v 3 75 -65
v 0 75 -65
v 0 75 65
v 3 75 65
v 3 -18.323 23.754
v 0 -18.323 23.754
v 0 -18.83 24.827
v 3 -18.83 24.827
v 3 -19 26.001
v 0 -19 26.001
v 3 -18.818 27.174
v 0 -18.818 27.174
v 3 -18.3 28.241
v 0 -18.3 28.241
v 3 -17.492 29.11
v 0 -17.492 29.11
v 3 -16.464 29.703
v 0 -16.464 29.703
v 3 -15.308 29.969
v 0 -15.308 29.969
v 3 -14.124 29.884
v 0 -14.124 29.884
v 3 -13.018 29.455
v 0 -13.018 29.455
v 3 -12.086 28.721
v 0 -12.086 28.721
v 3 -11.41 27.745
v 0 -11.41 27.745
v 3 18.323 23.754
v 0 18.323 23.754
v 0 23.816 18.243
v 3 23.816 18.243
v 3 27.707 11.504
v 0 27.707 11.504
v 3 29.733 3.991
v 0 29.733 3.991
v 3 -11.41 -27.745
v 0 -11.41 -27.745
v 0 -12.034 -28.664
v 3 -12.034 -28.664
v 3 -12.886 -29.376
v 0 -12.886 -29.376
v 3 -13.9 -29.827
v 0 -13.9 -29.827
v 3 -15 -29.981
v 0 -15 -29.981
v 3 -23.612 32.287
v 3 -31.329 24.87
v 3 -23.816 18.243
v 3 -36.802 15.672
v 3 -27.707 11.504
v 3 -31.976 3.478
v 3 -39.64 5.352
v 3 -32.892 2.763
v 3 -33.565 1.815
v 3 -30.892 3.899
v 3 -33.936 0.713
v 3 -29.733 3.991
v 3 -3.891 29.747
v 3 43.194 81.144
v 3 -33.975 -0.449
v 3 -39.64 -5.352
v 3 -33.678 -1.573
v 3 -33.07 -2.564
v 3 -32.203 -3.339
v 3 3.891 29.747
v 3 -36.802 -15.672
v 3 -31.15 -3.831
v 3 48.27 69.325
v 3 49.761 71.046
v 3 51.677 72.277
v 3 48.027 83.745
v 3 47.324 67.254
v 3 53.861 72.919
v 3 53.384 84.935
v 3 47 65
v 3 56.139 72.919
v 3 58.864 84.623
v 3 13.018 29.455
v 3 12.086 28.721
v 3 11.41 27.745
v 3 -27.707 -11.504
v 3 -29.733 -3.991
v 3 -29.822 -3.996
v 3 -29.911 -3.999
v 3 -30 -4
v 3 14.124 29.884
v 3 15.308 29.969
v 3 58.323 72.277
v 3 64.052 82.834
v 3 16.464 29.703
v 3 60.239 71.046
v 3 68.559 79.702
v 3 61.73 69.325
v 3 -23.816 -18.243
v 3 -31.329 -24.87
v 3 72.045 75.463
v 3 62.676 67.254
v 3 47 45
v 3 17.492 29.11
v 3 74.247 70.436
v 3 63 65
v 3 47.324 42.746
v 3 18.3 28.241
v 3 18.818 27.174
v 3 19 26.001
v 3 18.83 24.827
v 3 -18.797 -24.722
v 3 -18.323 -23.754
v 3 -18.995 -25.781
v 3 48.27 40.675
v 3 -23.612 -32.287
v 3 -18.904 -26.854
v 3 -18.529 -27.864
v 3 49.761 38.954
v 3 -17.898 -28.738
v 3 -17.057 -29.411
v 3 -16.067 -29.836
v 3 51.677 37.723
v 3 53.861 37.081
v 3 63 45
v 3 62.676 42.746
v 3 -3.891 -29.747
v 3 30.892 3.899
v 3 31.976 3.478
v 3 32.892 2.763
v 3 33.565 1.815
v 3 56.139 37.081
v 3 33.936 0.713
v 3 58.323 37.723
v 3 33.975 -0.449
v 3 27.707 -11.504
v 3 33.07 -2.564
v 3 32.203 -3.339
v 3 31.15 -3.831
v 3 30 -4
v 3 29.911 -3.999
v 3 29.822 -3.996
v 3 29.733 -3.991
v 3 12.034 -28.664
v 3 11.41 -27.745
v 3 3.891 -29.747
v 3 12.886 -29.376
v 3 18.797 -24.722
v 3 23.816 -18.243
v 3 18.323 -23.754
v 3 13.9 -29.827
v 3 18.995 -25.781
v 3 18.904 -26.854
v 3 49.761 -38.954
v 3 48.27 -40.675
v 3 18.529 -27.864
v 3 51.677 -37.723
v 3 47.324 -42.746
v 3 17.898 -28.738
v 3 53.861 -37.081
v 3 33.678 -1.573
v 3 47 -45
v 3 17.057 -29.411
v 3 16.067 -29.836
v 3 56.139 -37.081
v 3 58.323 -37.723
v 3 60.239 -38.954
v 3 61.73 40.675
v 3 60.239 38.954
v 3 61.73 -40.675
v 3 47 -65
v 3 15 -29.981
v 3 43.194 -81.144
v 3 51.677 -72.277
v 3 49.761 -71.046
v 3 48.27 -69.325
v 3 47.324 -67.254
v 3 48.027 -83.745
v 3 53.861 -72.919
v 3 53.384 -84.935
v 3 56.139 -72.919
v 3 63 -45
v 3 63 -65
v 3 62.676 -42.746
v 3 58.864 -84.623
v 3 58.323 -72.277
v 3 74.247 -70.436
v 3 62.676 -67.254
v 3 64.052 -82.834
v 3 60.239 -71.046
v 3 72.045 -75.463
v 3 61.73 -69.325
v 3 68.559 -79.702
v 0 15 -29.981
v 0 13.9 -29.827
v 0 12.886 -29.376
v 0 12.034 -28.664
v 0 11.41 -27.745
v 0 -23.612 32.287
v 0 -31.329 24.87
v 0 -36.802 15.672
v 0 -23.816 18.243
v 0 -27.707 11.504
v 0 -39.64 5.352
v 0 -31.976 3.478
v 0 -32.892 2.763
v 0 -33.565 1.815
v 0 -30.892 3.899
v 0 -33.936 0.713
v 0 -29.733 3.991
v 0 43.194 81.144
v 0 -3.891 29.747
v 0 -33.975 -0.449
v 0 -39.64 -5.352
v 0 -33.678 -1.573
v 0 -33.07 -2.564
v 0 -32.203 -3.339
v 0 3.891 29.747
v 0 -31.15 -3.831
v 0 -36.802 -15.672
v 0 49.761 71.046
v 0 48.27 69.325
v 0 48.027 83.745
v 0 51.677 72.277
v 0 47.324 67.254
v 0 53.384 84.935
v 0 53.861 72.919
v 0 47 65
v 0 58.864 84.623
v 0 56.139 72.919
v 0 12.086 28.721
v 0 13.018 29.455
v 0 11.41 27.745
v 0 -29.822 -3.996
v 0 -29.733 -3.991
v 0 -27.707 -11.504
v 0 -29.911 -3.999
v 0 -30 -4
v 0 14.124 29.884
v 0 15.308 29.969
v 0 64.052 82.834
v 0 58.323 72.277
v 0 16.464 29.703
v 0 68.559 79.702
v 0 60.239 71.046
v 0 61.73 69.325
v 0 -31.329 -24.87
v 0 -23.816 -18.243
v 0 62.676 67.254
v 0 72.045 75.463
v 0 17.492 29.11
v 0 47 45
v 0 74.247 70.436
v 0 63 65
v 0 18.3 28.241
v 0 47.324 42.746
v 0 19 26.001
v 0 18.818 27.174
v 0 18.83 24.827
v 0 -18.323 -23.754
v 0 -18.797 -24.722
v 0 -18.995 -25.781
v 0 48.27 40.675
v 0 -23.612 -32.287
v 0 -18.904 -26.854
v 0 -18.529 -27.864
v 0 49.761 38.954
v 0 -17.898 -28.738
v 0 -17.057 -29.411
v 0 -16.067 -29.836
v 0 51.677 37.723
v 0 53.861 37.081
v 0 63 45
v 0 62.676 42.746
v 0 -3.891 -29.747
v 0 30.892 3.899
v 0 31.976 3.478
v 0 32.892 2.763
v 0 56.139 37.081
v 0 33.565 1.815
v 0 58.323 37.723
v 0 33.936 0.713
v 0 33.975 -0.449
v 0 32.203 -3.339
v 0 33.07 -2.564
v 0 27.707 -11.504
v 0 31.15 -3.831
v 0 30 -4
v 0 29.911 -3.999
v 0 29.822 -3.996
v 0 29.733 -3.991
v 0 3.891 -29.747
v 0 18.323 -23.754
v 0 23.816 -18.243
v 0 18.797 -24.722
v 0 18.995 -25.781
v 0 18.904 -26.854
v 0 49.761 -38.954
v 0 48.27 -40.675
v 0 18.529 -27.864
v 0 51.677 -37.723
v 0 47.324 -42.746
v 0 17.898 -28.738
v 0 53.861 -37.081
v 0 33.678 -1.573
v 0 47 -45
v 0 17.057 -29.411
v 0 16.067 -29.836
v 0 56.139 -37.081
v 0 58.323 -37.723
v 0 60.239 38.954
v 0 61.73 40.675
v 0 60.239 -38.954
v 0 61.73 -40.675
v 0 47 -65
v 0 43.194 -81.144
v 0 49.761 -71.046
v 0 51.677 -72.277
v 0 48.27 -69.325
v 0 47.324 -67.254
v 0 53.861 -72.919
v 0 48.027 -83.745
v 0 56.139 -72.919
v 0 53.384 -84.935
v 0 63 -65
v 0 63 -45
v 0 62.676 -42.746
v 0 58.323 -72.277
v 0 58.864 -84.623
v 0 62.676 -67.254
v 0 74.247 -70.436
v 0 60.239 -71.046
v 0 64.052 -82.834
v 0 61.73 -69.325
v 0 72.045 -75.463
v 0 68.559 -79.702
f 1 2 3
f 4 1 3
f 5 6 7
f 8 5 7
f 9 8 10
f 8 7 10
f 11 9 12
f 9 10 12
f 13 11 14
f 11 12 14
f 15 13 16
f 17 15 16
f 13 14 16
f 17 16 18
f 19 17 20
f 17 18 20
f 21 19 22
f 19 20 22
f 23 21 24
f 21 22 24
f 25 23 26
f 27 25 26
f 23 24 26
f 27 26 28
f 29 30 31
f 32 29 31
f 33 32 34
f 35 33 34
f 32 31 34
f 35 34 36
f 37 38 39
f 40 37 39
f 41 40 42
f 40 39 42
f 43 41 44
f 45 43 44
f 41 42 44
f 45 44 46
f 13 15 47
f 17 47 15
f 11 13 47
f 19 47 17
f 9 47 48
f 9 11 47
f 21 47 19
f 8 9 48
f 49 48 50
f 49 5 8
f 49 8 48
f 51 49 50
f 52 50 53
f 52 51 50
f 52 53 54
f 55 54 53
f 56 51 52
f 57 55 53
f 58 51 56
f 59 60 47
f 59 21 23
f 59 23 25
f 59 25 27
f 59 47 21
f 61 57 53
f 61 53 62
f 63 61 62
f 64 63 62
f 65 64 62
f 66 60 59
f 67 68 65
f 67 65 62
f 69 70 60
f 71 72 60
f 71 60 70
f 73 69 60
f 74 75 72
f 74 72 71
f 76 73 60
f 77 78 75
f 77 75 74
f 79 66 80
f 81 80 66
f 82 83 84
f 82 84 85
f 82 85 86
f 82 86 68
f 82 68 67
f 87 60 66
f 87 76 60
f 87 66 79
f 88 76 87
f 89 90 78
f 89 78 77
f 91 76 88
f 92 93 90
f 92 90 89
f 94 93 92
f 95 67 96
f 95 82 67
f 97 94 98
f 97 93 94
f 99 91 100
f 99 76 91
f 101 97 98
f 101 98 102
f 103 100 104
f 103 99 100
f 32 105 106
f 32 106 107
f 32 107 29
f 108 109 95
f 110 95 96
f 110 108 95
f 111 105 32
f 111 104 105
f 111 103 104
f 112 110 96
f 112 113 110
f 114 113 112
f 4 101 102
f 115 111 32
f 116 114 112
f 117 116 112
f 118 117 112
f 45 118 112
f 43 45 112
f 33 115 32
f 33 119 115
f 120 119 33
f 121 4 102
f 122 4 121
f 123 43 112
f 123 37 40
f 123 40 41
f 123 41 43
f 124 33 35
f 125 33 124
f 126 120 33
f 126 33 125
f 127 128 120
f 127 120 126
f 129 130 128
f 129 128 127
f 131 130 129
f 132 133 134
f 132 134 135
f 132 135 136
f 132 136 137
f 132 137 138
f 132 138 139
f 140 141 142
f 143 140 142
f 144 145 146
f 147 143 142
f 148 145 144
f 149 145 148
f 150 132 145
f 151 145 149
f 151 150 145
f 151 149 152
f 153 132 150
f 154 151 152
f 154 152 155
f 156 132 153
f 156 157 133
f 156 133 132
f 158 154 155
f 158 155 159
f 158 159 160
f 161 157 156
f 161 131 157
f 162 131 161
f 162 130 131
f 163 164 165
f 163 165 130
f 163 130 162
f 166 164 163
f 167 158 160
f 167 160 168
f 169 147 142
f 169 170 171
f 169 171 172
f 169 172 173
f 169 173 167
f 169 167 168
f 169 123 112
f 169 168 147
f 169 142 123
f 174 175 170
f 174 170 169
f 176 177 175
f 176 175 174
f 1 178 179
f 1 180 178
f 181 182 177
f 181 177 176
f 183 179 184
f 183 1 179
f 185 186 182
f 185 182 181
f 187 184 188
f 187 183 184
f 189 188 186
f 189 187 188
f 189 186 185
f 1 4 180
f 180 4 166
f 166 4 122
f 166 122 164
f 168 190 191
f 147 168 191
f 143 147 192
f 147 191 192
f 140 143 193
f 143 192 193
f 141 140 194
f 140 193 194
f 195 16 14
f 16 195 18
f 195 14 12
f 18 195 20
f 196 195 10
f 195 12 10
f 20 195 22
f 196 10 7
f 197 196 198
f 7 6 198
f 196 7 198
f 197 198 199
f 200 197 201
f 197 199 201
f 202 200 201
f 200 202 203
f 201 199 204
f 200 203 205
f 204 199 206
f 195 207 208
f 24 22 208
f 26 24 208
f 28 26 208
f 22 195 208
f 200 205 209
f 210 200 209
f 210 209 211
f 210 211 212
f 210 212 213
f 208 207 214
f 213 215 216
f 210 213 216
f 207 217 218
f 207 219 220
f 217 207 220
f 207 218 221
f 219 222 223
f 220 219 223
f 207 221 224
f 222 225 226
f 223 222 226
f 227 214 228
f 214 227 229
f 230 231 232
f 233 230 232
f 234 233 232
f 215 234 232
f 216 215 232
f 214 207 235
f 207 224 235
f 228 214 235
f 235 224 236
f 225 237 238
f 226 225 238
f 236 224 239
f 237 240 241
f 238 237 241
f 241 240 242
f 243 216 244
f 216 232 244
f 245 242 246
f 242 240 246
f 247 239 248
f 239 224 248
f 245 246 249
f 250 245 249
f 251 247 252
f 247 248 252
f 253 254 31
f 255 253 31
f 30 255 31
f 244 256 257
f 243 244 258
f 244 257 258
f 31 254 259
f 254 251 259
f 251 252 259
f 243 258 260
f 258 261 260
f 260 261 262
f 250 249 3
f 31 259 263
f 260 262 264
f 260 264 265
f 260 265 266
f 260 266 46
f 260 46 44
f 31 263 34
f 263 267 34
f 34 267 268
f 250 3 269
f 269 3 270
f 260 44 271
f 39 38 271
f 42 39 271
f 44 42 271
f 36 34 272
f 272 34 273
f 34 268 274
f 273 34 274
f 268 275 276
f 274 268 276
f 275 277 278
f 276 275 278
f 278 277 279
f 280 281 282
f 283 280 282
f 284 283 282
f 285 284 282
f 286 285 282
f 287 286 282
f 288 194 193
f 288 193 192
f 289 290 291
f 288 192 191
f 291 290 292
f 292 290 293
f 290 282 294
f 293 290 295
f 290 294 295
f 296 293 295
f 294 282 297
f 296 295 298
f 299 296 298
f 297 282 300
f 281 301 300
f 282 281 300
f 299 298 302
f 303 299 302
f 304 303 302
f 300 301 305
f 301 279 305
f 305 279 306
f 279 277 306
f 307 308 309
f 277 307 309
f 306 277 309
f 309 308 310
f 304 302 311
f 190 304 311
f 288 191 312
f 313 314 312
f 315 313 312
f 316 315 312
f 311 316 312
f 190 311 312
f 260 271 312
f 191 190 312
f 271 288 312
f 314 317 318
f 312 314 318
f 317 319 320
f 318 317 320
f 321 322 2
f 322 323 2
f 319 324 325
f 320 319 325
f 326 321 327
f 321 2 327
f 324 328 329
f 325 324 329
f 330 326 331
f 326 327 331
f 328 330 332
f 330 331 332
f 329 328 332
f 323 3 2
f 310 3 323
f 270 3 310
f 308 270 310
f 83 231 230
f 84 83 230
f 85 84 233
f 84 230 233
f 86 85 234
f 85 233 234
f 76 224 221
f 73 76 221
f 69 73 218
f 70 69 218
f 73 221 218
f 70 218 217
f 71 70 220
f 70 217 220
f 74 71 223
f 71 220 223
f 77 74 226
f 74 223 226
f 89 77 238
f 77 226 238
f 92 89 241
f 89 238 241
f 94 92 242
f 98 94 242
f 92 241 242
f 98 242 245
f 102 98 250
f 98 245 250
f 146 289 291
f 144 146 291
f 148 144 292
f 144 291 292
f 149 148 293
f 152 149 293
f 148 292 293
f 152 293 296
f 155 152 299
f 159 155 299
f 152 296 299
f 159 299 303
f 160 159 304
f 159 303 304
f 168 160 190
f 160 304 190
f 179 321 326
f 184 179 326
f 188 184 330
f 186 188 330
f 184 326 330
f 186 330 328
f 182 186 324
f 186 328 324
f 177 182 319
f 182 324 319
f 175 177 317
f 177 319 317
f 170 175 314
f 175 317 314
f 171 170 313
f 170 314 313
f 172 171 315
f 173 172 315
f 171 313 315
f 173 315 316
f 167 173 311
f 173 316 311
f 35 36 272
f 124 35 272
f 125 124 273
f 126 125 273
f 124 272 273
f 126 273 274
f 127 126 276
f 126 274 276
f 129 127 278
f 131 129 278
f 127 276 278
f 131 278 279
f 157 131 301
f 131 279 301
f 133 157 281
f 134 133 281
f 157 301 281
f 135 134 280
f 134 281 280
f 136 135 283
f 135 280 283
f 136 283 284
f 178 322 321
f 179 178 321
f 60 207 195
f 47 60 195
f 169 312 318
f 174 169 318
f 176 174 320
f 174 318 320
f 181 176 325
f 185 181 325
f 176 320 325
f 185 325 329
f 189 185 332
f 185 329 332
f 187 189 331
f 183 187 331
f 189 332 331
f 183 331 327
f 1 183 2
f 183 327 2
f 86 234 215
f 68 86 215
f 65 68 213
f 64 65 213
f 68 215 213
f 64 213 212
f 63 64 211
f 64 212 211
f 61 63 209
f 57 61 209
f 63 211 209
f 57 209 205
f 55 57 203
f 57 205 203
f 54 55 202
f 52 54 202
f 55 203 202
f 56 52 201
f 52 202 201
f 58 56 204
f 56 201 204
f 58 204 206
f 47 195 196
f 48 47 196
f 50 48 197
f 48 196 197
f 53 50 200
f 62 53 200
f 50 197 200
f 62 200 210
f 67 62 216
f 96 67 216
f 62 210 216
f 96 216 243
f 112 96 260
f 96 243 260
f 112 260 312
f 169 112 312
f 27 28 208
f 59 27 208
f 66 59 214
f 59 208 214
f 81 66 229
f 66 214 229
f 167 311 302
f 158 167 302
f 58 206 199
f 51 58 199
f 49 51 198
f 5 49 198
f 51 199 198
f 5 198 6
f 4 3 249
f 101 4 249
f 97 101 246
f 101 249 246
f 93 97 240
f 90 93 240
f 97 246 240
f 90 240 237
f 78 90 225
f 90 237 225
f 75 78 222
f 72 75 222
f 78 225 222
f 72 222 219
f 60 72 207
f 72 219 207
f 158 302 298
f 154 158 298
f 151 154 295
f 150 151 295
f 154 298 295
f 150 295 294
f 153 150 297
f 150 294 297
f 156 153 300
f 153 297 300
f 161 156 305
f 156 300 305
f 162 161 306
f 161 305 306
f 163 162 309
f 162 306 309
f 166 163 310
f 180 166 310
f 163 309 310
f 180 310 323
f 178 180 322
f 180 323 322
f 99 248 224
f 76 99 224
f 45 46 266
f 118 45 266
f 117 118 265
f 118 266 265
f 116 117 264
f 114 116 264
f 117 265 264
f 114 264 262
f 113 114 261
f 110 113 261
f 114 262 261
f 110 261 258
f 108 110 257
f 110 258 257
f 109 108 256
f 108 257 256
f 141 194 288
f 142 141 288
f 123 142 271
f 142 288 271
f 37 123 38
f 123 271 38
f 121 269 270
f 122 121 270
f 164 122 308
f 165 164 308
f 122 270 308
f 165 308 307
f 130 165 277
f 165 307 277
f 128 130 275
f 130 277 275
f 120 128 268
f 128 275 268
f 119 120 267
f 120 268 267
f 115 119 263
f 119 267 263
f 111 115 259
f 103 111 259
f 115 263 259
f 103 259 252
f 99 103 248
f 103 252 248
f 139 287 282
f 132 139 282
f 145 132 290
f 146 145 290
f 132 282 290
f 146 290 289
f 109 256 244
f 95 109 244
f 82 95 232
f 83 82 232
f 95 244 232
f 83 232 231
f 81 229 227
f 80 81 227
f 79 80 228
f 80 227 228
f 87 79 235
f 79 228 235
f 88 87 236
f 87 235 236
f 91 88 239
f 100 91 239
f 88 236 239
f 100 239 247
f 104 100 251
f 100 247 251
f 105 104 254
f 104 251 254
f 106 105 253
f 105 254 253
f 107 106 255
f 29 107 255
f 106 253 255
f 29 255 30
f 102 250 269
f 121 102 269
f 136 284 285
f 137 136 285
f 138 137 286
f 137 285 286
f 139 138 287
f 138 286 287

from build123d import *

# Parameters (mm, degrees)
BOSS_EXTRUDE2_DEPTH = 3


with BuildPart() as part:
    # Sketch1 → Boss-Extrude2 (new body)
    with BuildSketch(Plane(origin=(0, 0, 0), x_dir=(0, 0, -1), z_dir=(1, 0, 0))):
        with BuildLine():
            Line((65, 75), (-65, 75))
            ThreePointArc((-65, 75), (-82.834261673, 64.052022459), (-81.143613719, 43.193911059))
            Line((-81.143613719, 43.193911059), (-32.287227439, -23.612177882))
            ThreePointArc((-32.287227439, -23.612177882), (0, -40), (32.287227439, -23.612177882))
            Line((32.287227439, -23.612177882), (81.143613719, 43.193911059))
            ThreePointArc((81.143613719, 43.193911059), (82.834261673, 64.052022459), (65, 75))
        make_face()
        with BuildLine():
            ThreePointArc((-27.745372612, -11.410271628), (-30, 0), (-27.745372612, 11.410271628))
            ThreePointArc((-27.745372612, 11.410271628), (-29.444863729, 17), (-23.7542714, 18.323061706))
            ThreePointArc((-23.7542714, 18.323061706), (-15, 25.980762114), (-3.991101213, 29.733333333))
            ThreePointArc((-3.991101213, 29.733333333), (-0.133407552, 33.997774684), (4, 30))
            ThreePointArc((4, 30), (3.997774684, 29.866592448), (3.991101213, 29.733333333))
            ThreePointArc((3.991101213, 29.733333333), (15, 25.980762114), (23.7542714, 18.323061706))
            ThreePointArc((23.7542714, 18.323061706), (27.864115127, 18.528878211), (29.980762114, 15))
            ThreePointArc((29.980762114, 15), (29.376232773, 12.885578329), (27.745372612, 11.410271628))
            ThreePointArc((27.745372612, 11.410271628), (30, 0), (27.745372612, -11.410271628))
            ThreePointArc((27.745372612, -11.410271628), (29.376232773, -12.885578329), (29.980762114, -15))
            ThreePointArc((29.980762114, -15), (27.864115127, -18.528878211), (23.7542714, -18.323061706))
            ThreePointArc((23.7542714, -18.323061706), (15, -25.980762114), (3.991101213, -29.733333333))
            ThreePointArc((3.991101213, -29.733333333), (3.997774684, -29.866592448), (4, -30))
            ThreePointArc((4, -30), (-0.133407552, -33.997774684), (-3.991101213, -29.733333333))
            ThreePointArc((-3.991101213, -29.733333333), (-15, -25.980762114), (-23.7542714, -18.323061706))
            ThreePointArc((-23.7542714, -18.323061706), (-29.444863729, -17), (-27.745372612, -11.410271628))
        make_face(mode=Mode.SUBTRACT)
        with BuildLine():
            ThreePointArc((-65, 47), (-73, 55), (-65, 63))
            Line((-65, 63), (-45, 63))
            ThreePointArc((-45, 63), (-37, 55), (-45, 47))
            Line((-45, 47), (-65, 47))
        make_face(mode=Mode.SUBTRACT)
        with BuildLine():
            ThreePointArc((65, 63), (73, 55), (65, 47))
            Line((65, 47), (45, 47))
            ThreePointArc((45, 47), (37, 55), (45, 63))
            Line((45, 63), (65, 63))
        make_face(mode=Mode.SUBTRACT)
    extrude(amount=BOSS_EXTRUDE2_DEPTH)


solid = part.part
